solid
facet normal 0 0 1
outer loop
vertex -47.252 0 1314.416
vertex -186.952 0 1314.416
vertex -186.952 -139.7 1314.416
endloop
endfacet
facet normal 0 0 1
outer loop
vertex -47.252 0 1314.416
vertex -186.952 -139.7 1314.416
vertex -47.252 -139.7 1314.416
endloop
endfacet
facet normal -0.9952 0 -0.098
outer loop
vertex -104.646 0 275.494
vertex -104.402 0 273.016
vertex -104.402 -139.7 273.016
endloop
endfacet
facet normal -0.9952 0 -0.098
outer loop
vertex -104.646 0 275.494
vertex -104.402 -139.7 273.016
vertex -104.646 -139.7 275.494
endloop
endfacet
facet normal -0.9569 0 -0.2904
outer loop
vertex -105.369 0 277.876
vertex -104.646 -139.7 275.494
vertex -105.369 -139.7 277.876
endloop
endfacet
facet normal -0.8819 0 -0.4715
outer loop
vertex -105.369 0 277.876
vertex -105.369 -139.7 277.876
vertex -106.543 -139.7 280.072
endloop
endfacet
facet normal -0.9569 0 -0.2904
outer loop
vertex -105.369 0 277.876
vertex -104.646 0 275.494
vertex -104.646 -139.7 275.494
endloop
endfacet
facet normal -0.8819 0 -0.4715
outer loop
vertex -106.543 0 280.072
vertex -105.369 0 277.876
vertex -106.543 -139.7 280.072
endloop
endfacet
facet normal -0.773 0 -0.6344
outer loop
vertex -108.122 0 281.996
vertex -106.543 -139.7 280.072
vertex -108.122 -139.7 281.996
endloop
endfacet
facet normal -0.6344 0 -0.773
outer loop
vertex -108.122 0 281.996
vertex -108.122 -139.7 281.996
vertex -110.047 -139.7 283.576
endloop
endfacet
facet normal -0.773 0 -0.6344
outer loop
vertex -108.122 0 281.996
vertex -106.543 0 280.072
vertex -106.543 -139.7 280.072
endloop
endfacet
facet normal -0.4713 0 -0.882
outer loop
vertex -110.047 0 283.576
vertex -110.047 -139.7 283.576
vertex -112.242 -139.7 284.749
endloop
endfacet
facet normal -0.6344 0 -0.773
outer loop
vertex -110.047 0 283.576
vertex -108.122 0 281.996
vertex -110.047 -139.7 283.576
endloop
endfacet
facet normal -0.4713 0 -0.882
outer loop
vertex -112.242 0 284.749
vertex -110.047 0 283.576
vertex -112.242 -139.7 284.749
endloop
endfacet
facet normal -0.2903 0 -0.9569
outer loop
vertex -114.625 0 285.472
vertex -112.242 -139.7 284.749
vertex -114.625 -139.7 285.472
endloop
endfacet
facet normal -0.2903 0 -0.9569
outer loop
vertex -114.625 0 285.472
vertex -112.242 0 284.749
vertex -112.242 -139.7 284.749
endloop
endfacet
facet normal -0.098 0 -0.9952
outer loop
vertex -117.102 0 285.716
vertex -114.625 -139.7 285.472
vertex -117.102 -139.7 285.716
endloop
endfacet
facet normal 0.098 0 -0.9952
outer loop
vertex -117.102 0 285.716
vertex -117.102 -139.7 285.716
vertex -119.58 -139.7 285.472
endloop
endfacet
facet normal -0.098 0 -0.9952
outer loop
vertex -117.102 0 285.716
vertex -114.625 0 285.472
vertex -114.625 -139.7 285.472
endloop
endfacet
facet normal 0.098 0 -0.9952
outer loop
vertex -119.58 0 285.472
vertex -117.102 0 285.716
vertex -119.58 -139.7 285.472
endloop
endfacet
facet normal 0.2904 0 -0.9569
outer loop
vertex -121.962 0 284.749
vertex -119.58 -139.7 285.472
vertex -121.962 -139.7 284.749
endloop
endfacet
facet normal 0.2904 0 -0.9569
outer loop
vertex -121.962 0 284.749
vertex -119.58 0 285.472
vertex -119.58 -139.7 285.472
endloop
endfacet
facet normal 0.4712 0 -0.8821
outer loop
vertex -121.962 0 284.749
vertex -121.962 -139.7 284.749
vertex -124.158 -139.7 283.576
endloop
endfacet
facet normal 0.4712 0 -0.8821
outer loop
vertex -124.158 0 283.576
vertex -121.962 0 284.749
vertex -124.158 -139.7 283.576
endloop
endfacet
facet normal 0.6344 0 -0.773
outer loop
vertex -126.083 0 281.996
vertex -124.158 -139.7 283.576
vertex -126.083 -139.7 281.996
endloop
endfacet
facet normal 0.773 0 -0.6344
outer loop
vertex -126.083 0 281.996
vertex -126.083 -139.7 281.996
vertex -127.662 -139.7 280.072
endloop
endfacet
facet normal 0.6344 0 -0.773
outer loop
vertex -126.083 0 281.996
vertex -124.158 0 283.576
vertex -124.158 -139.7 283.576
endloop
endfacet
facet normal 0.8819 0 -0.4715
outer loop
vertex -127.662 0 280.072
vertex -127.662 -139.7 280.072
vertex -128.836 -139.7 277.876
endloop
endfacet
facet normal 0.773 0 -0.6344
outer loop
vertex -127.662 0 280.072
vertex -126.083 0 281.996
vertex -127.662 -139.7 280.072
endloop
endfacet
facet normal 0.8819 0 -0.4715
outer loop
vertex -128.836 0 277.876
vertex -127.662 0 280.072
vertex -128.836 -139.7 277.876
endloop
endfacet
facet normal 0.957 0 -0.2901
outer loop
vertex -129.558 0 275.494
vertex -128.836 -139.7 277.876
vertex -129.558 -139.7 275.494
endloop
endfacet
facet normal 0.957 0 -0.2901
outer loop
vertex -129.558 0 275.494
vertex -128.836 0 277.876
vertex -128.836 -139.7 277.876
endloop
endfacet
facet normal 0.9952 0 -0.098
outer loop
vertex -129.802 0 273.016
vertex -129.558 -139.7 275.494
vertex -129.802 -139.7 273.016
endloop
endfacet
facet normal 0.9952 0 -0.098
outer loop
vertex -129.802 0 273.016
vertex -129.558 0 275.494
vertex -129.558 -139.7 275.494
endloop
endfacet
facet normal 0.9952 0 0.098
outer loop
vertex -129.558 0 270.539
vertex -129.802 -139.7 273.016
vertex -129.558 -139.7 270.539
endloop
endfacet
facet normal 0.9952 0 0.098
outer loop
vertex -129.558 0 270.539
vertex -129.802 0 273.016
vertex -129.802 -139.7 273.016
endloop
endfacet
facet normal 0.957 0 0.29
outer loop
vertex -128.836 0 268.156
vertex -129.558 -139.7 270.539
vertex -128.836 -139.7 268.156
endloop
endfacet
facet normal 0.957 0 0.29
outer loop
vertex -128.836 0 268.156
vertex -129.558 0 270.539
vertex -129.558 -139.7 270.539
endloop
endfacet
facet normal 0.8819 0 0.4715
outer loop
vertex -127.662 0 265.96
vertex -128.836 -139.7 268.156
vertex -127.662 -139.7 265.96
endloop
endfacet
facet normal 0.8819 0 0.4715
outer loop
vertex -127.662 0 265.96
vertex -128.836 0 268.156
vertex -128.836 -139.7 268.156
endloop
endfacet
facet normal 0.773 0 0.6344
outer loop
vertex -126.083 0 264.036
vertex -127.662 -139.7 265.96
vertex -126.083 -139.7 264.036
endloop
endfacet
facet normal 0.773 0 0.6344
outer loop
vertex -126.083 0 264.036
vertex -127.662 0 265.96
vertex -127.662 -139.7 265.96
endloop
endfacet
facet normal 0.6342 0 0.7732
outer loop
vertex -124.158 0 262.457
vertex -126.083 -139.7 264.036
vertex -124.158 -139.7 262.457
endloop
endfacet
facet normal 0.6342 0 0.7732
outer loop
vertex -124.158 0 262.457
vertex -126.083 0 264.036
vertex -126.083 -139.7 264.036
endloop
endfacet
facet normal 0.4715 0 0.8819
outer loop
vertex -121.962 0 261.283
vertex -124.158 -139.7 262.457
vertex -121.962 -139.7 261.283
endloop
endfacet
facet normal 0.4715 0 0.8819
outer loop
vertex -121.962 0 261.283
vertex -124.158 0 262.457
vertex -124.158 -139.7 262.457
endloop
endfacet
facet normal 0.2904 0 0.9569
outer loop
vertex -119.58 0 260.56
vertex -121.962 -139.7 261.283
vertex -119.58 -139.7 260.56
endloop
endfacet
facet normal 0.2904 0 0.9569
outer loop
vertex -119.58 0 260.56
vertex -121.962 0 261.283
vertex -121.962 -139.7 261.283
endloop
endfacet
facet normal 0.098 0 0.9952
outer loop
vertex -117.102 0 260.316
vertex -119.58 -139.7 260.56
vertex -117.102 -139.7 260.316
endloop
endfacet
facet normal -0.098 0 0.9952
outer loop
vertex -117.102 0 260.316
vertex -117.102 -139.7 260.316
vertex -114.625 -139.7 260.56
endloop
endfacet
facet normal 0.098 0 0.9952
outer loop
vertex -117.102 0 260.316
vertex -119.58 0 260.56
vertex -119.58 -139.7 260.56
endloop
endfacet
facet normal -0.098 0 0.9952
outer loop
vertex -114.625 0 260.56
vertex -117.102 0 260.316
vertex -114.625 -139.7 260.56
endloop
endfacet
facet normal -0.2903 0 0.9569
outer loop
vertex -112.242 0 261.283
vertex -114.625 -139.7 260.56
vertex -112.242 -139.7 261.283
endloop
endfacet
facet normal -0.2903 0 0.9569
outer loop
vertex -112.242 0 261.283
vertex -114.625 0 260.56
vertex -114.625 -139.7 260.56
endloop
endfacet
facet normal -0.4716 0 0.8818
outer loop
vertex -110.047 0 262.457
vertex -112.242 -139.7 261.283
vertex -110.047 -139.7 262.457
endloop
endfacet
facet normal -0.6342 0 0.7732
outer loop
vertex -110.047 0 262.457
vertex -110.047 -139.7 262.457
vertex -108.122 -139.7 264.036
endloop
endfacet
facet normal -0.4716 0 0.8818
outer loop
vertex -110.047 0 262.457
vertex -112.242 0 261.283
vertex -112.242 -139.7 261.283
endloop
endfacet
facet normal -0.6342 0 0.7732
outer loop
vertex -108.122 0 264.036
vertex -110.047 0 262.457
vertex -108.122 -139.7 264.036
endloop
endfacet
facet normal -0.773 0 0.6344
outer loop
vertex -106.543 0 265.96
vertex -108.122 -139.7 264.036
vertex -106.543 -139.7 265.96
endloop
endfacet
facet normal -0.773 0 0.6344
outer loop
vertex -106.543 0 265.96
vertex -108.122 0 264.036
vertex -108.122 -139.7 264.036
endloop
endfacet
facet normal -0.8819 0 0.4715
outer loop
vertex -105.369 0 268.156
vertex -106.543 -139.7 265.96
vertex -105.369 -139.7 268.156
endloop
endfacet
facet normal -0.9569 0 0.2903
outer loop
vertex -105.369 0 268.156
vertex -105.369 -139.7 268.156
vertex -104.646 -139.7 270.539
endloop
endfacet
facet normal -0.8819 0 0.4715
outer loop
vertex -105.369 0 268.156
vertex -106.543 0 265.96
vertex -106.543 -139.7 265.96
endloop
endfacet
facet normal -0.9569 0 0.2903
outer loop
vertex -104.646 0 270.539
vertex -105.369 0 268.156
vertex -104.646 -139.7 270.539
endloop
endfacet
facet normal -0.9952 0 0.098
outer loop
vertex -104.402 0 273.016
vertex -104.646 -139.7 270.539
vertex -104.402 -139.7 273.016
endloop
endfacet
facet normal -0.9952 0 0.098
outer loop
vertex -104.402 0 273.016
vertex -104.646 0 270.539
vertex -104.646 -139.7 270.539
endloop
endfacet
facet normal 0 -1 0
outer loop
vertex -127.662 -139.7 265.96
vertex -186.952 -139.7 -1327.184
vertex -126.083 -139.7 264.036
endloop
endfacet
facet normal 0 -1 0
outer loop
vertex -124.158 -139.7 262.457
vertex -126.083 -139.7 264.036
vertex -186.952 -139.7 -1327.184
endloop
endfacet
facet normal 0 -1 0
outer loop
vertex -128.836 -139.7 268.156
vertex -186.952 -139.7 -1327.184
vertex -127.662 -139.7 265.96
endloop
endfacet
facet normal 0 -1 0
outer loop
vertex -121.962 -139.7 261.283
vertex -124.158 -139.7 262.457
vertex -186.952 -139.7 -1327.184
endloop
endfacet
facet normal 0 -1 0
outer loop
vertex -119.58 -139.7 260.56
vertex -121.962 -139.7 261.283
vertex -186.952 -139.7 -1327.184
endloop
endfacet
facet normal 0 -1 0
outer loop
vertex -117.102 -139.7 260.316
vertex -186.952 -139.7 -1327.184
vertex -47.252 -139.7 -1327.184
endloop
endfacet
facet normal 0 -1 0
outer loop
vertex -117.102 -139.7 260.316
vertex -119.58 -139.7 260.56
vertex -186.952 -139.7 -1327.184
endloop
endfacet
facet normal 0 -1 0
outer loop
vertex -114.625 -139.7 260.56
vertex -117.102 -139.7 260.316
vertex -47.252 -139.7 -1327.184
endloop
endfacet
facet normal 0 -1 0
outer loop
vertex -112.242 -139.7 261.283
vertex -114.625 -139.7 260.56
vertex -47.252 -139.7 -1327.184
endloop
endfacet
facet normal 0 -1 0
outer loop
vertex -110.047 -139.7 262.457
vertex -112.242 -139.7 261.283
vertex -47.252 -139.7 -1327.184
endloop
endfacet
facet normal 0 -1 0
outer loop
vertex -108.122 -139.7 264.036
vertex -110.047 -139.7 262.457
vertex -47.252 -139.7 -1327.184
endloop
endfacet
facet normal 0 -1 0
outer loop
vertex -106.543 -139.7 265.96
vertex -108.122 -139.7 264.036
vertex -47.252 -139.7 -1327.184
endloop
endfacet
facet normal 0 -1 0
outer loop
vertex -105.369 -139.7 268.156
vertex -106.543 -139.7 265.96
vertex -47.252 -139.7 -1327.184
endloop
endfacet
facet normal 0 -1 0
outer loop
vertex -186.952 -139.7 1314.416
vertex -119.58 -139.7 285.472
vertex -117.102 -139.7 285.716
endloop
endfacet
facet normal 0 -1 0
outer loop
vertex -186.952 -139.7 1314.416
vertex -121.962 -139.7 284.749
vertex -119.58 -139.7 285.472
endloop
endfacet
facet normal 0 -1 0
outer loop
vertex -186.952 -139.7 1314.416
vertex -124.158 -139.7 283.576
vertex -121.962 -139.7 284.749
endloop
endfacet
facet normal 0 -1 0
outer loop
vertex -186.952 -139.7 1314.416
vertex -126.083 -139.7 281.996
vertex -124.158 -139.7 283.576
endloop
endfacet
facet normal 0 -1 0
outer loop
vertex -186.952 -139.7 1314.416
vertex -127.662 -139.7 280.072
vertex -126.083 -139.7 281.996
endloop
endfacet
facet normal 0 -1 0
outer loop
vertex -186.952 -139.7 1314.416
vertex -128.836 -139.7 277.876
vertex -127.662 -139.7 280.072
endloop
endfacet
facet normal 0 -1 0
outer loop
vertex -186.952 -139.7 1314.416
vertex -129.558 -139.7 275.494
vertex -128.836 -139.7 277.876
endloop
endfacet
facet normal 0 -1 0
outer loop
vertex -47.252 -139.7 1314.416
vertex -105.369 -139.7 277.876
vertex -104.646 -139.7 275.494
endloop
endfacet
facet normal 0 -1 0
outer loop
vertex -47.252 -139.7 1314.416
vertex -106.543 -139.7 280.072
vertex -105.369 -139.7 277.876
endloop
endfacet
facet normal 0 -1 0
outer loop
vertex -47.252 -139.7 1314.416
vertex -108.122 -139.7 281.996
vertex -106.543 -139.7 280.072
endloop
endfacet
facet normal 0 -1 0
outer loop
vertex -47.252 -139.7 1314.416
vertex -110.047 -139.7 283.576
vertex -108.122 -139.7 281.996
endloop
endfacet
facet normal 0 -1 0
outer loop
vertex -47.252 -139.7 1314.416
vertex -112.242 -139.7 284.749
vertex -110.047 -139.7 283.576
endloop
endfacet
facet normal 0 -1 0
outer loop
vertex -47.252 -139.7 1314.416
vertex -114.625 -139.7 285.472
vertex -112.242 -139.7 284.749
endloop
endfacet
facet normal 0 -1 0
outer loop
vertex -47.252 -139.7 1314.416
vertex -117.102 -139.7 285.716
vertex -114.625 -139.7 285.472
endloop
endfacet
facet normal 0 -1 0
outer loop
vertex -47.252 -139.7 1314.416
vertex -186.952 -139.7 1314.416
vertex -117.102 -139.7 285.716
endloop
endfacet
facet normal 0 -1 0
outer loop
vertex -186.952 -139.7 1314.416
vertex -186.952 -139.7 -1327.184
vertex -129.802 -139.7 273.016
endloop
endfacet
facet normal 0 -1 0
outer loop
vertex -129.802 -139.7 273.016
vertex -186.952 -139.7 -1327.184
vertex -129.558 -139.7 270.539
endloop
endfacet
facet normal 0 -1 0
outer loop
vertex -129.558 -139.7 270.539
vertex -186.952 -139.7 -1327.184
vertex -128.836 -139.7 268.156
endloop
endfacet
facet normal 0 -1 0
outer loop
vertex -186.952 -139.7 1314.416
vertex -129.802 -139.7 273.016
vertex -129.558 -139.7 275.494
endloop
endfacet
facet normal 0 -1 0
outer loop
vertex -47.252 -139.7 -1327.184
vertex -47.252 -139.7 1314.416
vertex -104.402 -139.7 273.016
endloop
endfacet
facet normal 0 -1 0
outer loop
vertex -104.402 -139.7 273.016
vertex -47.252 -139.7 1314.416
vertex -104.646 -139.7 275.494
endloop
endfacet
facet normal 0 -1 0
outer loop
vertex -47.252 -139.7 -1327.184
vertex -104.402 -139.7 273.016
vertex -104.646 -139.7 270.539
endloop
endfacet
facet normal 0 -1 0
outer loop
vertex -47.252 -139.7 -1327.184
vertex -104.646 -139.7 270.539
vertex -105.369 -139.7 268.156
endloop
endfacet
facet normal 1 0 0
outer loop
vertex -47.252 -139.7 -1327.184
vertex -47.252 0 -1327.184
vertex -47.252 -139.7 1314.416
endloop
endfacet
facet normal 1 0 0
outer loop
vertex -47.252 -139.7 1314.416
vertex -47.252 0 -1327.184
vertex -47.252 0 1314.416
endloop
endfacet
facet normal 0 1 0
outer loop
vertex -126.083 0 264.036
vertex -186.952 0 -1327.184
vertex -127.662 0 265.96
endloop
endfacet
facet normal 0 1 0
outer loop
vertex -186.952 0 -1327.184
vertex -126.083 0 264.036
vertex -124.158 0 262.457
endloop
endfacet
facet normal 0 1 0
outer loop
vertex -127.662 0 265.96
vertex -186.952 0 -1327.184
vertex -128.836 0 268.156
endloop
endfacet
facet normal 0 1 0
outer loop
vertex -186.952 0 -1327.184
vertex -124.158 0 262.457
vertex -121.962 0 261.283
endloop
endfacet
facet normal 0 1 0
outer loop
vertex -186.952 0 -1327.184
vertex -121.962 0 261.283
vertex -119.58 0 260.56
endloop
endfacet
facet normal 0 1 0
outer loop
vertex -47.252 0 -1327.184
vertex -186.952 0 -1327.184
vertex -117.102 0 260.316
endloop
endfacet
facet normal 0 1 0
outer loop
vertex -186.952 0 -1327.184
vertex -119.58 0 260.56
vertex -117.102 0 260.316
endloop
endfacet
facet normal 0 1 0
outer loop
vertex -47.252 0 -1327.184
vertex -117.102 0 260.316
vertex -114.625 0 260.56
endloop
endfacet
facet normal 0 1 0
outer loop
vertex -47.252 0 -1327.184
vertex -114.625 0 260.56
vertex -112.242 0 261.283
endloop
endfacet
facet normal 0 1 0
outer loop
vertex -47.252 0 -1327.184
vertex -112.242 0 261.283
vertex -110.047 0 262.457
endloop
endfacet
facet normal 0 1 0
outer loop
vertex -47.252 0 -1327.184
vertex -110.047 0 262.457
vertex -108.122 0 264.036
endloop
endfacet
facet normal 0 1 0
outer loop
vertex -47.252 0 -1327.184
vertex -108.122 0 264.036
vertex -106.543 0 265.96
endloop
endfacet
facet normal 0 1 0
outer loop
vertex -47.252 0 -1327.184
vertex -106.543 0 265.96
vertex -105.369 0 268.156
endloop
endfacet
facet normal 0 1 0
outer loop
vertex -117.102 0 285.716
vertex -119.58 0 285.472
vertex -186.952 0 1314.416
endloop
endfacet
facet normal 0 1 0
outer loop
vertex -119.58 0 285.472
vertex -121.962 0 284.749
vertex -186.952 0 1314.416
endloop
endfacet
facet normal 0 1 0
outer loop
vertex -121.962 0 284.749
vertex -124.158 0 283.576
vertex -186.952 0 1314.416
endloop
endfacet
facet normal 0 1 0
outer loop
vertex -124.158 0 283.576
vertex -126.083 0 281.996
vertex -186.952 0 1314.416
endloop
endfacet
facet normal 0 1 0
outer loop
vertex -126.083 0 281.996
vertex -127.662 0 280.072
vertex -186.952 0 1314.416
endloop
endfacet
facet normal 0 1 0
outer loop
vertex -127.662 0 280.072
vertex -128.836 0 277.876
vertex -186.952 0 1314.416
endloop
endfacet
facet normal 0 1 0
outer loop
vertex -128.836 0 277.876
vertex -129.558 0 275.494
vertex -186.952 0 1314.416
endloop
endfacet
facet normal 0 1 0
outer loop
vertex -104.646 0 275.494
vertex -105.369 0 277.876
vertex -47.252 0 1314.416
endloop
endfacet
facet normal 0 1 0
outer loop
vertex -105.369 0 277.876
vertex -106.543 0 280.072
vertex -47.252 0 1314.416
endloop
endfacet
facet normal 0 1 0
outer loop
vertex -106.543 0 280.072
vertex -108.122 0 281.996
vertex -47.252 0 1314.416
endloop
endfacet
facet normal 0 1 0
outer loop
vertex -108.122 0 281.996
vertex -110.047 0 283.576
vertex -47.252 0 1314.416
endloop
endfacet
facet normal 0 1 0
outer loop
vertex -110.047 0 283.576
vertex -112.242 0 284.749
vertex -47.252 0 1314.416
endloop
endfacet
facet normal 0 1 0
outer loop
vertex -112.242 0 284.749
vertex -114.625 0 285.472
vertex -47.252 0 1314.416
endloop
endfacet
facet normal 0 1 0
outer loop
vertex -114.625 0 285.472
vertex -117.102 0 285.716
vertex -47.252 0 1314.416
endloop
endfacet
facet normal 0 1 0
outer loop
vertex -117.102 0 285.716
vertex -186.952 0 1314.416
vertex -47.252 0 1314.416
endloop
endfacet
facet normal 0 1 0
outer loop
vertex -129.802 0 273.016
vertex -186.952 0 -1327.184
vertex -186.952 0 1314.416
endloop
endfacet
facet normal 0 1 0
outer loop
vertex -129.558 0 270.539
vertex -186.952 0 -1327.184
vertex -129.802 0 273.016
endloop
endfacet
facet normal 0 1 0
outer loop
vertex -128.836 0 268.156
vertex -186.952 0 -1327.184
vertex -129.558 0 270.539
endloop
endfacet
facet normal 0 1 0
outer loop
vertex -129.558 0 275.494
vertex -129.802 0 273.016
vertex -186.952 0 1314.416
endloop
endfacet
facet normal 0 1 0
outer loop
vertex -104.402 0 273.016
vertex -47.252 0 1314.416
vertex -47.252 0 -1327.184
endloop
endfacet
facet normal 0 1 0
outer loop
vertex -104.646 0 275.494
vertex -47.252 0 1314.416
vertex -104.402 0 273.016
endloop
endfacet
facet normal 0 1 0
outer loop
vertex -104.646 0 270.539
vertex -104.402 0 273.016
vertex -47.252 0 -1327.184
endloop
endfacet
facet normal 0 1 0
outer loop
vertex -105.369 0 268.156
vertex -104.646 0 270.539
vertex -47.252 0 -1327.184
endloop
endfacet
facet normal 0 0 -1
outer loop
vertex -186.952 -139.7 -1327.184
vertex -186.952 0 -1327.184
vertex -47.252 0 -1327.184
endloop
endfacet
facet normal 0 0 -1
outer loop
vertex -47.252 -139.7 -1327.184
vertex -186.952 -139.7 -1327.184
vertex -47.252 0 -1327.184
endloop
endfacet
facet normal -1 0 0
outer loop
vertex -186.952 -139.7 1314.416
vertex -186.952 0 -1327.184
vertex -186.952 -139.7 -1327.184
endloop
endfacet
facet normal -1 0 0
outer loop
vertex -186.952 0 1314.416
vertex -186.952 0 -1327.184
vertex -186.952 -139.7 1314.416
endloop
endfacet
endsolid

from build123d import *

# Parameters (mm, degrees)
F0_W     = 139.7
F0_H     = 2641.6
F0_R     = 12.7
F1_DEPTH = 139.7


with BuildPart() as f1:
    # F0 (on Front) → F1 (new body)
    with BuildSketch(Plane.XZ):
        with Locations((-117.102299, -6.383777)):
            Rectangle(F0_W, F0_H)
        with Locations((-117.102299, 273.016223)):
            Circle(F0_R, mode=Mode.SUBTRACT)
    extrude(amount=F1_DEPTH)


solid = f1.part
